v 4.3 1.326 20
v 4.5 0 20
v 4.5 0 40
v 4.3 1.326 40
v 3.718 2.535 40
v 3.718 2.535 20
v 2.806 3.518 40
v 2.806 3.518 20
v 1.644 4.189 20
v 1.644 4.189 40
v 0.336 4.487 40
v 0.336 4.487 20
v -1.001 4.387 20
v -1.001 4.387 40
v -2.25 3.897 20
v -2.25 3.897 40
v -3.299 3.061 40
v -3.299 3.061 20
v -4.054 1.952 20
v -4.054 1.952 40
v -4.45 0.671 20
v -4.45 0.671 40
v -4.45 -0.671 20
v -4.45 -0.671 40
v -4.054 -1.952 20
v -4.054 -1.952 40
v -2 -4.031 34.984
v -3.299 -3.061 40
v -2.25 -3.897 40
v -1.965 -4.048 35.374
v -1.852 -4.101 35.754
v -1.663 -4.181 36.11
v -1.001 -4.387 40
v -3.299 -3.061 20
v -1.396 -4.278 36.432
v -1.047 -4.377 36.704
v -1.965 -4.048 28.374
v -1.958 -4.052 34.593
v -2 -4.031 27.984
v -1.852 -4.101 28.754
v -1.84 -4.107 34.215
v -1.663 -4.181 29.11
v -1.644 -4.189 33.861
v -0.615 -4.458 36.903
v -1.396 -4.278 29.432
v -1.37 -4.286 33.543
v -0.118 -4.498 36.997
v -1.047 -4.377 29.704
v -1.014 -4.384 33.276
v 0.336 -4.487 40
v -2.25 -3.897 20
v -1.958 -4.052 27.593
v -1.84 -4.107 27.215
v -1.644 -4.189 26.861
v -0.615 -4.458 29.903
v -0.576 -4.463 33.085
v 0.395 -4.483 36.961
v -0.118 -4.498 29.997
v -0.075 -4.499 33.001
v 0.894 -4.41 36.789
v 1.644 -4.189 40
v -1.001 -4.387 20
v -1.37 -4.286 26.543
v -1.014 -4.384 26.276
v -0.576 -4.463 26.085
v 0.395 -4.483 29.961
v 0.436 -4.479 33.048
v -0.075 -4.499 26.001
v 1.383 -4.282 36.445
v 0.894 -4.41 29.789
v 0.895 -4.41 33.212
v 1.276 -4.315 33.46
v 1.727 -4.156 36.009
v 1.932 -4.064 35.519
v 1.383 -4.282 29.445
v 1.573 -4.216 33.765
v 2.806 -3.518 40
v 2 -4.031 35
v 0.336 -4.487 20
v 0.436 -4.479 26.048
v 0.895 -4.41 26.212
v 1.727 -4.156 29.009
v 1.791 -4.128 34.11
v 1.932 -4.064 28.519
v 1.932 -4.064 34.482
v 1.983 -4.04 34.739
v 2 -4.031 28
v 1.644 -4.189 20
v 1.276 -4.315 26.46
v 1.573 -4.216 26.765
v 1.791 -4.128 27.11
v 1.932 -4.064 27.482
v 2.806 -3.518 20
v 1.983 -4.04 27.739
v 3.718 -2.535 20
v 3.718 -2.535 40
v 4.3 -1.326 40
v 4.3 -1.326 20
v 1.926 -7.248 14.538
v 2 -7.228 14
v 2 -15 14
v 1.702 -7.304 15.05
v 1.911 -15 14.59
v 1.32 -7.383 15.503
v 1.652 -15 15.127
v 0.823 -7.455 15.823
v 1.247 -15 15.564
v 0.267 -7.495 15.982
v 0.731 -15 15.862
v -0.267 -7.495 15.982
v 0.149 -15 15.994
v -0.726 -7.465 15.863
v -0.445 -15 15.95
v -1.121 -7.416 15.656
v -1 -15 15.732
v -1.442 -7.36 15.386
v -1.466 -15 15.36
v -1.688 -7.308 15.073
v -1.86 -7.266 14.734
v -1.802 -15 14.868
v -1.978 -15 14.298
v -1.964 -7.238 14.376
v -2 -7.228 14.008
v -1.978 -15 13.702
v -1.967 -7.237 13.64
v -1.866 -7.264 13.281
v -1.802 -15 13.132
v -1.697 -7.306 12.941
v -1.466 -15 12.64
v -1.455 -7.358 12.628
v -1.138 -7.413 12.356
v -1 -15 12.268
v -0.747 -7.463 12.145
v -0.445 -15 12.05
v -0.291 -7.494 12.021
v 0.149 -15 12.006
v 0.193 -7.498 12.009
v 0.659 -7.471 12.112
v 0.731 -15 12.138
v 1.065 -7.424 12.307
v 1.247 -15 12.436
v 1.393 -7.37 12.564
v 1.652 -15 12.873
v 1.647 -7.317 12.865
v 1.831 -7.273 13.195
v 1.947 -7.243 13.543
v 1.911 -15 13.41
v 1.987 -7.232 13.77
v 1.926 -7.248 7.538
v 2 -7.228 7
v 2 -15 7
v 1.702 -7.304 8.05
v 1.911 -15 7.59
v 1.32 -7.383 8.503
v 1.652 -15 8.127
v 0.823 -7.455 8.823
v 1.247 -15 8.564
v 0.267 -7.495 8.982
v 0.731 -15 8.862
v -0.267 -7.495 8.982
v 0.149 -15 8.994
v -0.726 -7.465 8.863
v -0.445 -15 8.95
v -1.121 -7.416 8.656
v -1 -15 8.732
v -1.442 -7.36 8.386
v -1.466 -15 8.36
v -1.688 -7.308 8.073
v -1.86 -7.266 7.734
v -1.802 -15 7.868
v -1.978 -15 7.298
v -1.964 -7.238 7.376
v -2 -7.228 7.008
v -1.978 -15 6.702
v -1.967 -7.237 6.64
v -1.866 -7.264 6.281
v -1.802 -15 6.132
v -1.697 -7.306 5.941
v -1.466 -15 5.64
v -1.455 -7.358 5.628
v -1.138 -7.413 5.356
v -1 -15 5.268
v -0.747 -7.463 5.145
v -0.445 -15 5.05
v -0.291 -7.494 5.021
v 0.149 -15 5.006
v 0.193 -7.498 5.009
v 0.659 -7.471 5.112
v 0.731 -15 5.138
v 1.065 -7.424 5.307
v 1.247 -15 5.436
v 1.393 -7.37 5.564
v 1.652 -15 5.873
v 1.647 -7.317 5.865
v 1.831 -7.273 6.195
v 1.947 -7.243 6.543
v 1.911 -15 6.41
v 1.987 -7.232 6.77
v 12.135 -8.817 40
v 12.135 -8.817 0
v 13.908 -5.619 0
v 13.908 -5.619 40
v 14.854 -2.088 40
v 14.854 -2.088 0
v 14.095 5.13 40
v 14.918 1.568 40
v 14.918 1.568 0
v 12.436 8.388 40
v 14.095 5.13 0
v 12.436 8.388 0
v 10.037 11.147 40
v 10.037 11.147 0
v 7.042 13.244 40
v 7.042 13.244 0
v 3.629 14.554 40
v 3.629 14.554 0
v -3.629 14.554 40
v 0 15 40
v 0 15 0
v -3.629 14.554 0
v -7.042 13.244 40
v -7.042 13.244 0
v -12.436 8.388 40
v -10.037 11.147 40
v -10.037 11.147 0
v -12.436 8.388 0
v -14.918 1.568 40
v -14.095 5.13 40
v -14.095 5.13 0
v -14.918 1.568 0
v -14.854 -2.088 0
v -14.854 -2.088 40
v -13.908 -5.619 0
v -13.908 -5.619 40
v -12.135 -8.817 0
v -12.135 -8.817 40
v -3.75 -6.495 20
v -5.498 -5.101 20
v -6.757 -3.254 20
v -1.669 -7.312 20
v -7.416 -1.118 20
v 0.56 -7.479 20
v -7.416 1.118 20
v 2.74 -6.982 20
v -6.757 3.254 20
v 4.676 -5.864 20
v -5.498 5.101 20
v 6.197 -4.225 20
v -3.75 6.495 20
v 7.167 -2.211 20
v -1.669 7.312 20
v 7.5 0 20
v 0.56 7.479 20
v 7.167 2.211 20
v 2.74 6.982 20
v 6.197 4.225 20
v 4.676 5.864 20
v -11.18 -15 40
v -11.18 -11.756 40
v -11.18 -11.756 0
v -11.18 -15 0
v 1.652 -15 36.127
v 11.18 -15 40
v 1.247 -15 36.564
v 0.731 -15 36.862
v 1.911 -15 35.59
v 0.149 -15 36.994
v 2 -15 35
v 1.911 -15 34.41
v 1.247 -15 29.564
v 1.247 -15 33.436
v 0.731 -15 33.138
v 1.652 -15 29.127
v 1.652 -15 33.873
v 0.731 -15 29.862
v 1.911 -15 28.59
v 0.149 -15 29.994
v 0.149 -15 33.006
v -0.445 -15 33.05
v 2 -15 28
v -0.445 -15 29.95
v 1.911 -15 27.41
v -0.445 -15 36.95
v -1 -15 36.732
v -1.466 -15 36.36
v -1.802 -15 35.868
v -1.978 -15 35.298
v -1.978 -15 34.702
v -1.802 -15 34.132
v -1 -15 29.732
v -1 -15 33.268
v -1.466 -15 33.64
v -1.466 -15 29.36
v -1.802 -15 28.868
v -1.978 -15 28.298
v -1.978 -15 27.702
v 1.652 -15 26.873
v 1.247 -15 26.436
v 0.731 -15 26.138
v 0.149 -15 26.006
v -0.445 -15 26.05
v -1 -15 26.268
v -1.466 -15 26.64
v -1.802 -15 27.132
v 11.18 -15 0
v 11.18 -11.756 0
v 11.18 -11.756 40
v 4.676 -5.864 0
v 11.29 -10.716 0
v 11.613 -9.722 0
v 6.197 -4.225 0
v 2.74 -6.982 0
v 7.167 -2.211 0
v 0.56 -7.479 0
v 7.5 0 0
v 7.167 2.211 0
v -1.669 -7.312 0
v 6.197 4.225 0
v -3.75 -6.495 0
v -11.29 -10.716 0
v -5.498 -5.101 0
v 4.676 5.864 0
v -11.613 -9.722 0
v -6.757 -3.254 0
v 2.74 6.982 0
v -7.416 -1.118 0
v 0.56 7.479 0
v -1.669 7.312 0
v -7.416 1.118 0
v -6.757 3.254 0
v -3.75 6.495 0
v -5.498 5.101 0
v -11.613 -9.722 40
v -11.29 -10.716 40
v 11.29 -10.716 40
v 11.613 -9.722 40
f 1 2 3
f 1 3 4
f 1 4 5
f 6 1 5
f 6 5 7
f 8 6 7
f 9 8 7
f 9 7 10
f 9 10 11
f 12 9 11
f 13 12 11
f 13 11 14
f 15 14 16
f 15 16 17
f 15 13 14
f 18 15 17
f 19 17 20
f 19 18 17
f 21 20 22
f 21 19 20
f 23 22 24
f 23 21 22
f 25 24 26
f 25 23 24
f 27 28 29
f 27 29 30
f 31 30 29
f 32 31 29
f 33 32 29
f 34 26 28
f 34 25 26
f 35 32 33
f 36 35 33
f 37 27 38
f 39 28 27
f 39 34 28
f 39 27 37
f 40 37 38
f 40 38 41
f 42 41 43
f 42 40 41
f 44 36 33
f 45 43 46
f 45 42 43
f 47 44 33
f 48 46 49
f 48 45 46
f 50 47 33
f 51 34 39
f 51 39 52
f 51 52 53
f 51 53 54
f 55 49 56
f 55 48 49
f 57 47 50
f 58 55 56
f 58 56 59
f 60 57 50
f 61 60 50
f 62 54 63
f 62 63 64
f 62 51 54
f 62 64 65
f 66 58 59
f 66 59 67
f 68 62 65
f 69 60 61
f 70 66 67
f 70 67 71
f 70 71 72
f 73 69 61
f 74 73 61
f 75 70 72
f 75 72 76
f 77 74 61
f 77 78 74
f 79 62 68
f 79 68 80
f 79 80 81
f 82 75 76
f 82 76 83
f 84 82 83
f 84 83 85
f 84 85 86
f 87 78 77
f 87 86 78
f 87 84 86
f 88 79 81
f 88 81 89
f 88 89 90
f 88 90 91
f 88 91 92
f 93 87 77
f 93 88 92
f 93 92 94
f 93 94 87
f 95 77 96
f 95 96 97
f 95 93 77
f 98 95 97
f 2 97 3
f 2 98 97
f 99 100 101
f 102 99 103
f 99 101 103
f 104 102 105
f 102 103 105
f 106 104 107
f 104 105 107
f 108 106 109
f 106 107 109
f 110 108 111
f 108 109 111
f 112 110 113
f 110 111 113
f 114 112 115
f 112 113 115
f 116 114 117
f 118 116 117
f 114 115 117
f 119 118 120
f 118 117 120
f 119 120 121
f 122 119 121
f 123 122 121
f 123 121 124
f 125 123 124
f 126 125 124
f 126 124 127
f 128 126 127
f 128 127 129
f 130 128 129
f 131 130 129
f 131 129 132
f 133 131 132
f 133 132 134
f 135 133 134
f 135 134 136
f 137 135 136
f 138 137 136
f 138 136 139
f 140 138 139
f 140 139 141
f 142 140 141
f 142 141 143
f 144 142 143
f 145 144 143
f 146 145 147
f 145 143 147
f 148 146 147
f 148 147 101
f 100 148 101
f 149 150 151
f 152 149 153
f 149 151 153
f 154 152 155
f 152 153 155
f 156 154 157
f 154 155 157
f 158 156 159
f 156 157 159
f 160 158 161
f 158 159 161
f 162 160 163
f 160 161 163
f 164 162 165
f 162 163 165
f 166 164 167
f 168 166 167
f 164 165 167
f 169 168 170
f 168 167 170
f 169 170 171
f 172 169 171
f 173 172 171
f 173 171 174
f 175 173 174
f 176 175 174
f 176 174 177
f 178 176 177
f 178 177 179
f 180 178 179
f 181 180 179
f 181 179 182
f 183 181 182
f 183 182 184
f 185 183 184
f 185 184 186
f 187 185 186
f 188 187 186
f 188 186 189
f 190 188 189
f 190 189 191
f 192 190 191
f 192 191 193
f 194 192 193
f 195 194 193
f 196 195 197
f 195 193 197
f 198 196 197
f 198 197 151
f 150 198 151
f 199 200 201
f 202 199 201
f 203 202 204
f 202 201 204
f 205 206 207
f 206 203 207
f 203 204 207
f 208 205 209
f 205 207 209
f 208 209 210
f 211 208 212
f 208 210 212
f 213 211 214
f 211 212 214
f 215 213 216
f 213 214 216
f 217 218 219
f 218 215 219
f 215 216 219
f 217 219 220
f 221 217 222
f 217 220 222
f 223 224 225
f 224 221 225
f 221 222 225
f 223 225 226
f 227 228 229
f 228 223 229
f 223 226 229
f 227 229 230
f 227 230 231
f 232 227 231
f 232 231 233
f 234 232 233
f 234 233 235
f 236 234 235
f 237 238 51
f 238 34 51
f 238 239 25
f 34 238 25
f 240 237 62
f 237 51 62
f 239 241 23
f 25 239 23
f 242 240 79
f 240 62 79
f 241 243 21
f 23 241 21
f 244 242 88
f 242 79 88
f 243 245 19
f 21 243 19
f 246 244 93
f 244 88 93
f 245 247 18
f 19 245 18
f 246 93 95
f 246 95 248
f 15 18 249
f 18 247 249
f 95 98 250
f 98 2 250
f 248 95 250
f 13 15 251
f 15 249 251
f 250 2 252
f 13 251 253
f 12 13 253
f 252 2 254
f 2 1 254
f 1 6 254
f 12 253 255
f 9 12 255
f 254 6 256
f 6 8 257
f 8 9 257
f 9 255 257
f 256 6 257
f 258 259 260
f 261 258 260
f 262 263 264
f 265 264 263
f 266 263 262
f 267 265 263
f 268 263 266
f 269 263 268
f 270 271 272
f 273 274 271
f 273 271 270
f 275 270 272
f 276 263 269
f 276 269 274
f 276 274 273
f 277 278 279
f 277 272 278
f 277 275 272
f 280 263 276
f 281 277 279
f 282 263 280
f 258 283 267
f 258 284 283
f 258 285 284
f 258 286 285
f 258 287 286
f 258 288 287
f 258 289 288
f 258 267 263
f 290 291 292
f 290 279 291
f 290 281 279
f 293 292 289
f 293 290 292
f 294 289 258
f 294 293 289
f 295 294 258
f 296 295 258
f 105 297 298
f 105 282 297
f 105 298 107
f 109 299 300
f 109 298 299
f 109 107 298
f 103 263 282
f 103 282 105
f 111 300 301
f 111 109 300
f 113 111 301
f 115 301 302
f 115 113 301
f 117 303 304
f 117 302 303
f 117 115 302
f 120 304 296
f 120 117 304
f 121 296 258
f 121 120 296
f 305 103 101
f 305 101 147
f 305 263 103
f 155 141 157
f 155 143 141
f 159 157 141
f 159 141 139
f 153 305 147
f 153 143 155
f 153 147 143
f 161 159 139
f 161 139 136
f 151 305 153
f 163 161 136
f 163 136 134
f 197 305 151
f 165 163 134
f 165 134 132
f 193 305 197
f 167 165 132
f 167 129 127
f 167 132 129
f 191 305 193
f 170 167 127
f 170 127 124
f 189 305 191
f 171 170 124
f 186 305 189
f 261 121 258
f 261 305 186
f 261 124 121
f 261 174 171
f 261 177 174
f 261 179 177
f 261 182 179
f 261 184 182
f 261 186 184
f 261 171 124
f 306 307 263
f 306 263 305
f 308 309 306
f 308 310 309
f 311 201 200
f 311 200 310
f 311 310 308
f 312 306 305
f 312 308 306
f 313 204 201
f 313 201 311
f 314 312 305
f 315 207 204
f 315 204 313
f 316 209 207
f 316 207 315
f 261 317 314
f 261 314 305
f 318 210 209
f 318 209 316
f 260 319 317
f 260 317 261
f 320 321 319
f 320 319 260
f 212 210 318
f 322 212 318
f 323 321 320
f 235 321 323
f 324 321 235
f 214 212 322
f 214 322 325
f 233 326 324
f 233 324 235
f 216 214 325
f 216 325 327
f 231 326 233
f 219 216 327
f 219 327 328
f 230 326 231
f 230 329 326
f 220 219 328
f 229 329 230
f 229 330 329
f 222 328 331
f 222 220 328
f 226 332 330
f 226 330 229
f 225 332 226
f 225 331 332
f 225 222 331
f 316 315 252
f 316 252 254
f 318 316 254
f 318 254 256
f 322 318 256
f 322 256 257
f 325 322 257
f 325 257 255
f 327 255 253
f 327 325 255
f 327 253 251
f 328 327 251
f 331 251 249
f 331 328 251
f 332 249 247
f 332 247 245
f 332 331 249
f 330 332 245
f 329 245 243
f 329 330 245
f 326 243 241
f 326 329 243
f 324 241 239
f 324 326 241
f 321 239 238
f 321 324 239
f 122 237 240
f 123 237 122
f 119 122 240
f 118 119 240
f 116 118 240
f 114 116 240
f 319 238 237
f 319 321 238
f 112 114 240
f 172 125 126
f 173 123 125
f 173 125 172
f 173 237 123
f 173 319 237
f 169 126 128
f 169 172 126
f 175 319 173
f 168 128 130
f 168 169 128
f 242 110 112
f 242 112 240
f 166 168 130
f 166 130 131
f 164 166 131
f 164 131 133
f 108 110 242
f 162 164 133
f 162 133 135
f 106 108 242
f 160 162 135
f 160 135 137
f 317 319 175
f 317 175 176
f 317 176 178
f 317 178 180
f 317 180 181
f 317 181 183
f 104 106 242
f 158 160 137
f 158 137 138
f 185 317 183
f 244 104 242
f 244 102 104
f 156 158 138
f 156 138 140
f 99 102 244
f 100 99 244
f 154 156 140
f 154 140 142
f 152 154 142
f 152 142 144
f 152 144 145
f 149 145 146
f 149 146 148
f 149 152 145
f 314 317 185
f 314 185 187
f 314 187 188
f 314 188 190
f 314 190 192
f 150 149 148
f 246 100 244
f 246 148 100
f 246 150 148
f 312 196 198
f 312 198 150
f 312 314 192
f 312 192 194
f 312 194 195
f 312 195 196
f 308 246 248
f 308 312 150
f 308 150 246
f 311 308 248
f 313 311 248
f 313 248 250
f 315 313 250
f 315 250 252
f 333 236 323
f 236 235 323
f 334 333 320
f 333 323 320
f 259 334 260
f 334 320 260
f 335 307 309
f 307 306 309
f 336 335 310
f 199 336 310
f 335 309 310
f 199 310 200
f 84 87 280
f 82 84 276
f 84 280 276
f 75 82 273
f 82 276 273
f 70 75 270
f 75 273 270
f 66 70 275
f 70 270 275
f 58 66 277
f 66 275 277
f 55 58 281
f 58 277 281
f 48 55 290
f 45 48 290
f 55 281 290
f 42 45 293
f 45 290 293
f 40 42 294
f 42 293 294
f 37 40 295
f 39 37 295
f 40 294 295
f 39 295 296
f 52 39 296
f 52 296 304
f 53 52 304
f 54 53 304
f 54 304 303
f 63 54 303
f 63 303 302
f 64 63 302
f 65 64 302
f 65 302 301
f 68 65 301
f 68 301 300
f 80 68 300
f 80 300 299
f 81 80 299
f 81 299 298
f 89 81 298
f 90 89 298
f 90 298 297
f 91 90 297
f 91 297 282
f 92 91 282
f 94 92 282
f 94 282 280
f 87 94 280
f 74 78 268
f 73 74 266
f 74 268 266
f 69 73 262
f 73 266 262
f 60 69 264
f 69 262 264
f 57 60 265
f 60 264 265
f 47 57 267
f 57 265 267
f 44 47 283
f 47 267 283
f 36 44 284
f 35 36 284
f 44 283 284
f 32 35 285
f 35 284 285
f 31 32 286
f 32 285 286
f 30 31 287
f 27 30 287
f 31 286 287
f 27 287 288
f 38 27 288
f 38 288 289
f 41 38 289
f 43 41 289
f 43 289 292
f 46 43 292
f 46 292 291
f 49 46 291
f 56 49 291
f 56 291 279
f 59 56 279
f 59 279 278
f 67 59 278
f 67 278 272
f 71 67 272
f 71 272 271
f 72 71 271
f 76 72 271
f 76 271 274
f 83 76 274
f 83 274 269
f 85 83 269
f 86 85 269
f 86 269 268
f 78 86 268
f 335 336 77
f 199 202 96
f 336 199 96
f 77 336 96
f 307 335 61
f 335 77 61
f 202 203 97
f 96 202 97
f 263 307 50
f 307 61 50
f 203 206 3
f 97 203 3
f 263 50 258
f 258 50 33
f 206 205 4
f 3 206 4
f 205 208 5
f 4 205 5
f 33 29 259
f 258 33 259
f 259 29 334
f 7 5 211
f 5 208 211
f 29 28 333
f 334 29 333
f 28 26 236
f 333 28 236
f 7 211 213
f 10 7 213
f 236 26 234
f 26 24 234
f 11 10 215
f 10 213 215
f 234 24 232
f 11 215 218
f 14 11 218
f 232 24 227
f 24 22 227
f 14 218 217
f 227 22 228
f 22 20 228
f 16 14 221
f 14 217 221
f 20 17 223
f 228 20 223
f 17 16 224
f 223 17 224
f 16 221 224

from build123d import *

# Parameters (mm, degrees)
SKETCH_R          = 15
SKETCH_R_2        = 7.5
PAD_DEPTH         = 20
SKETCH001_R       = 15
SKETCH001_R_2     = 4.5
PAD001_DEPTH      = 20
SKETCH002_W       = 20
SKETCH002_H       = 7
POCKET_DEPTH      = 40
POCKET_FACE2_W    = 1.18034
POCKET_FACE2_H    = 40
POCKET001_DEPTH   = 5
POCKET001_FACE2_W = 1.18034
POCKET001_FACE2_H = 40
POCKET002_DEPTH   = 5
POCKET002_FACE7_W = 22.36068
POCKET002_FACE7_H = 40
PAD002_DEPTH      = 5
FILLET_R          = 5
SKETCH003_R       = 2
POCKET003_DEPTH   = 13


with BuildPart() as part:
    # Sketch → Pad (new body)
    with BuildSketch(Plane.XY):
        Circle(SKETCH_R)
        Circle(SKETCH_R_2, mode=Mode.SUBTRACT)
    extrude(amount=PAD_DEPTH)

    # Sketch001 (on Face4 of Pad) → Pad001 (join)
    with BuildSketch(Plane.XY.offset(20)):
        Circle(SKETCH001_R)
        Circle(SKETCH001_R_2, mode=Mode.SUBTRACT)
    extrude(amount=PAD001_DEPTH)

    # Sketch002 (on Face1 of Pad001) → Pocket (cut)
    with BuildSketch(Plane(origin=(0, 0, 0), x_dir=(1, 0, 0), z_dir=(0, 0, -1))):
        with Locations((0, 13.5)):
            Rectangle(SKETCH002_W, SKETCH002_H)
    extrude(amount=-POCKET_DEPTH, mode=Mode.SUBTRACT)

    # Pocket Face2 → Pocket001 (cut)
    with BuildSketch(Plane(origin=(10, -10.59017, 20), x_dir=(0, 1, 0), z_dir=(-1, 0, 0))):
        Rectangle(POCKET_FACE2_W, POCKET_FACE2_H)
    extrude(amount=-POCKET001_DEPTH, mode=Mode.SUBTRACT)

    # Pocket001 Face2 → Pocket002 (cut)
    with BuildSketch(Plane(origin=(-10, -10.59017, 20), x_dir=(0, -1, 0), z_dir=(1, 0, 0))):
        Rectangle(POCKET001_FACE2_W, POCKET001_FACE2_H)
    extrude(amount=-POCKET002_DEPTH, mode=Mode.SUBTRACT)

    # Pocket002 Face7 → Pad002 (add)
    with BuildSketch(Plane(origin=(0, -10, 20), x_dir=(-1, 0, 0), z_dir=(0, -1, 0))):
        Rectangle(POCKET002_FACE7_W, POCKET002_FACE7_H)
    extrude(amount=PAD002_DEPTH)

    # Fillet
    fillet_edges = [part.edges().sort_by_distance(p)[0] for p in [
        (11.18034, -10, 20),
        (-11.18034, -10, 20),
    ]]
    fillet(fillet_edges, radius=FILLET_R)

    # Sketch003 (on Face7 of Fillet) → Pocket003 (cut)
    with BuildSketch(Plane.XZ.offset(15)):
        with Locations((0, 35)):
            Circle(SKETCH003_R)
        with Locations((0, 14)):
            Circle(SKETCH003_R)
        with Locations((0, 28)):
            Circle(SKETCH003_R)
        with Locations((0, 7)):
            Circle(SKETCH003_R)
    extrude(amount=-POCKET003_DEPTH, mode=Mode.SUBTRACT)


solid = part.part
